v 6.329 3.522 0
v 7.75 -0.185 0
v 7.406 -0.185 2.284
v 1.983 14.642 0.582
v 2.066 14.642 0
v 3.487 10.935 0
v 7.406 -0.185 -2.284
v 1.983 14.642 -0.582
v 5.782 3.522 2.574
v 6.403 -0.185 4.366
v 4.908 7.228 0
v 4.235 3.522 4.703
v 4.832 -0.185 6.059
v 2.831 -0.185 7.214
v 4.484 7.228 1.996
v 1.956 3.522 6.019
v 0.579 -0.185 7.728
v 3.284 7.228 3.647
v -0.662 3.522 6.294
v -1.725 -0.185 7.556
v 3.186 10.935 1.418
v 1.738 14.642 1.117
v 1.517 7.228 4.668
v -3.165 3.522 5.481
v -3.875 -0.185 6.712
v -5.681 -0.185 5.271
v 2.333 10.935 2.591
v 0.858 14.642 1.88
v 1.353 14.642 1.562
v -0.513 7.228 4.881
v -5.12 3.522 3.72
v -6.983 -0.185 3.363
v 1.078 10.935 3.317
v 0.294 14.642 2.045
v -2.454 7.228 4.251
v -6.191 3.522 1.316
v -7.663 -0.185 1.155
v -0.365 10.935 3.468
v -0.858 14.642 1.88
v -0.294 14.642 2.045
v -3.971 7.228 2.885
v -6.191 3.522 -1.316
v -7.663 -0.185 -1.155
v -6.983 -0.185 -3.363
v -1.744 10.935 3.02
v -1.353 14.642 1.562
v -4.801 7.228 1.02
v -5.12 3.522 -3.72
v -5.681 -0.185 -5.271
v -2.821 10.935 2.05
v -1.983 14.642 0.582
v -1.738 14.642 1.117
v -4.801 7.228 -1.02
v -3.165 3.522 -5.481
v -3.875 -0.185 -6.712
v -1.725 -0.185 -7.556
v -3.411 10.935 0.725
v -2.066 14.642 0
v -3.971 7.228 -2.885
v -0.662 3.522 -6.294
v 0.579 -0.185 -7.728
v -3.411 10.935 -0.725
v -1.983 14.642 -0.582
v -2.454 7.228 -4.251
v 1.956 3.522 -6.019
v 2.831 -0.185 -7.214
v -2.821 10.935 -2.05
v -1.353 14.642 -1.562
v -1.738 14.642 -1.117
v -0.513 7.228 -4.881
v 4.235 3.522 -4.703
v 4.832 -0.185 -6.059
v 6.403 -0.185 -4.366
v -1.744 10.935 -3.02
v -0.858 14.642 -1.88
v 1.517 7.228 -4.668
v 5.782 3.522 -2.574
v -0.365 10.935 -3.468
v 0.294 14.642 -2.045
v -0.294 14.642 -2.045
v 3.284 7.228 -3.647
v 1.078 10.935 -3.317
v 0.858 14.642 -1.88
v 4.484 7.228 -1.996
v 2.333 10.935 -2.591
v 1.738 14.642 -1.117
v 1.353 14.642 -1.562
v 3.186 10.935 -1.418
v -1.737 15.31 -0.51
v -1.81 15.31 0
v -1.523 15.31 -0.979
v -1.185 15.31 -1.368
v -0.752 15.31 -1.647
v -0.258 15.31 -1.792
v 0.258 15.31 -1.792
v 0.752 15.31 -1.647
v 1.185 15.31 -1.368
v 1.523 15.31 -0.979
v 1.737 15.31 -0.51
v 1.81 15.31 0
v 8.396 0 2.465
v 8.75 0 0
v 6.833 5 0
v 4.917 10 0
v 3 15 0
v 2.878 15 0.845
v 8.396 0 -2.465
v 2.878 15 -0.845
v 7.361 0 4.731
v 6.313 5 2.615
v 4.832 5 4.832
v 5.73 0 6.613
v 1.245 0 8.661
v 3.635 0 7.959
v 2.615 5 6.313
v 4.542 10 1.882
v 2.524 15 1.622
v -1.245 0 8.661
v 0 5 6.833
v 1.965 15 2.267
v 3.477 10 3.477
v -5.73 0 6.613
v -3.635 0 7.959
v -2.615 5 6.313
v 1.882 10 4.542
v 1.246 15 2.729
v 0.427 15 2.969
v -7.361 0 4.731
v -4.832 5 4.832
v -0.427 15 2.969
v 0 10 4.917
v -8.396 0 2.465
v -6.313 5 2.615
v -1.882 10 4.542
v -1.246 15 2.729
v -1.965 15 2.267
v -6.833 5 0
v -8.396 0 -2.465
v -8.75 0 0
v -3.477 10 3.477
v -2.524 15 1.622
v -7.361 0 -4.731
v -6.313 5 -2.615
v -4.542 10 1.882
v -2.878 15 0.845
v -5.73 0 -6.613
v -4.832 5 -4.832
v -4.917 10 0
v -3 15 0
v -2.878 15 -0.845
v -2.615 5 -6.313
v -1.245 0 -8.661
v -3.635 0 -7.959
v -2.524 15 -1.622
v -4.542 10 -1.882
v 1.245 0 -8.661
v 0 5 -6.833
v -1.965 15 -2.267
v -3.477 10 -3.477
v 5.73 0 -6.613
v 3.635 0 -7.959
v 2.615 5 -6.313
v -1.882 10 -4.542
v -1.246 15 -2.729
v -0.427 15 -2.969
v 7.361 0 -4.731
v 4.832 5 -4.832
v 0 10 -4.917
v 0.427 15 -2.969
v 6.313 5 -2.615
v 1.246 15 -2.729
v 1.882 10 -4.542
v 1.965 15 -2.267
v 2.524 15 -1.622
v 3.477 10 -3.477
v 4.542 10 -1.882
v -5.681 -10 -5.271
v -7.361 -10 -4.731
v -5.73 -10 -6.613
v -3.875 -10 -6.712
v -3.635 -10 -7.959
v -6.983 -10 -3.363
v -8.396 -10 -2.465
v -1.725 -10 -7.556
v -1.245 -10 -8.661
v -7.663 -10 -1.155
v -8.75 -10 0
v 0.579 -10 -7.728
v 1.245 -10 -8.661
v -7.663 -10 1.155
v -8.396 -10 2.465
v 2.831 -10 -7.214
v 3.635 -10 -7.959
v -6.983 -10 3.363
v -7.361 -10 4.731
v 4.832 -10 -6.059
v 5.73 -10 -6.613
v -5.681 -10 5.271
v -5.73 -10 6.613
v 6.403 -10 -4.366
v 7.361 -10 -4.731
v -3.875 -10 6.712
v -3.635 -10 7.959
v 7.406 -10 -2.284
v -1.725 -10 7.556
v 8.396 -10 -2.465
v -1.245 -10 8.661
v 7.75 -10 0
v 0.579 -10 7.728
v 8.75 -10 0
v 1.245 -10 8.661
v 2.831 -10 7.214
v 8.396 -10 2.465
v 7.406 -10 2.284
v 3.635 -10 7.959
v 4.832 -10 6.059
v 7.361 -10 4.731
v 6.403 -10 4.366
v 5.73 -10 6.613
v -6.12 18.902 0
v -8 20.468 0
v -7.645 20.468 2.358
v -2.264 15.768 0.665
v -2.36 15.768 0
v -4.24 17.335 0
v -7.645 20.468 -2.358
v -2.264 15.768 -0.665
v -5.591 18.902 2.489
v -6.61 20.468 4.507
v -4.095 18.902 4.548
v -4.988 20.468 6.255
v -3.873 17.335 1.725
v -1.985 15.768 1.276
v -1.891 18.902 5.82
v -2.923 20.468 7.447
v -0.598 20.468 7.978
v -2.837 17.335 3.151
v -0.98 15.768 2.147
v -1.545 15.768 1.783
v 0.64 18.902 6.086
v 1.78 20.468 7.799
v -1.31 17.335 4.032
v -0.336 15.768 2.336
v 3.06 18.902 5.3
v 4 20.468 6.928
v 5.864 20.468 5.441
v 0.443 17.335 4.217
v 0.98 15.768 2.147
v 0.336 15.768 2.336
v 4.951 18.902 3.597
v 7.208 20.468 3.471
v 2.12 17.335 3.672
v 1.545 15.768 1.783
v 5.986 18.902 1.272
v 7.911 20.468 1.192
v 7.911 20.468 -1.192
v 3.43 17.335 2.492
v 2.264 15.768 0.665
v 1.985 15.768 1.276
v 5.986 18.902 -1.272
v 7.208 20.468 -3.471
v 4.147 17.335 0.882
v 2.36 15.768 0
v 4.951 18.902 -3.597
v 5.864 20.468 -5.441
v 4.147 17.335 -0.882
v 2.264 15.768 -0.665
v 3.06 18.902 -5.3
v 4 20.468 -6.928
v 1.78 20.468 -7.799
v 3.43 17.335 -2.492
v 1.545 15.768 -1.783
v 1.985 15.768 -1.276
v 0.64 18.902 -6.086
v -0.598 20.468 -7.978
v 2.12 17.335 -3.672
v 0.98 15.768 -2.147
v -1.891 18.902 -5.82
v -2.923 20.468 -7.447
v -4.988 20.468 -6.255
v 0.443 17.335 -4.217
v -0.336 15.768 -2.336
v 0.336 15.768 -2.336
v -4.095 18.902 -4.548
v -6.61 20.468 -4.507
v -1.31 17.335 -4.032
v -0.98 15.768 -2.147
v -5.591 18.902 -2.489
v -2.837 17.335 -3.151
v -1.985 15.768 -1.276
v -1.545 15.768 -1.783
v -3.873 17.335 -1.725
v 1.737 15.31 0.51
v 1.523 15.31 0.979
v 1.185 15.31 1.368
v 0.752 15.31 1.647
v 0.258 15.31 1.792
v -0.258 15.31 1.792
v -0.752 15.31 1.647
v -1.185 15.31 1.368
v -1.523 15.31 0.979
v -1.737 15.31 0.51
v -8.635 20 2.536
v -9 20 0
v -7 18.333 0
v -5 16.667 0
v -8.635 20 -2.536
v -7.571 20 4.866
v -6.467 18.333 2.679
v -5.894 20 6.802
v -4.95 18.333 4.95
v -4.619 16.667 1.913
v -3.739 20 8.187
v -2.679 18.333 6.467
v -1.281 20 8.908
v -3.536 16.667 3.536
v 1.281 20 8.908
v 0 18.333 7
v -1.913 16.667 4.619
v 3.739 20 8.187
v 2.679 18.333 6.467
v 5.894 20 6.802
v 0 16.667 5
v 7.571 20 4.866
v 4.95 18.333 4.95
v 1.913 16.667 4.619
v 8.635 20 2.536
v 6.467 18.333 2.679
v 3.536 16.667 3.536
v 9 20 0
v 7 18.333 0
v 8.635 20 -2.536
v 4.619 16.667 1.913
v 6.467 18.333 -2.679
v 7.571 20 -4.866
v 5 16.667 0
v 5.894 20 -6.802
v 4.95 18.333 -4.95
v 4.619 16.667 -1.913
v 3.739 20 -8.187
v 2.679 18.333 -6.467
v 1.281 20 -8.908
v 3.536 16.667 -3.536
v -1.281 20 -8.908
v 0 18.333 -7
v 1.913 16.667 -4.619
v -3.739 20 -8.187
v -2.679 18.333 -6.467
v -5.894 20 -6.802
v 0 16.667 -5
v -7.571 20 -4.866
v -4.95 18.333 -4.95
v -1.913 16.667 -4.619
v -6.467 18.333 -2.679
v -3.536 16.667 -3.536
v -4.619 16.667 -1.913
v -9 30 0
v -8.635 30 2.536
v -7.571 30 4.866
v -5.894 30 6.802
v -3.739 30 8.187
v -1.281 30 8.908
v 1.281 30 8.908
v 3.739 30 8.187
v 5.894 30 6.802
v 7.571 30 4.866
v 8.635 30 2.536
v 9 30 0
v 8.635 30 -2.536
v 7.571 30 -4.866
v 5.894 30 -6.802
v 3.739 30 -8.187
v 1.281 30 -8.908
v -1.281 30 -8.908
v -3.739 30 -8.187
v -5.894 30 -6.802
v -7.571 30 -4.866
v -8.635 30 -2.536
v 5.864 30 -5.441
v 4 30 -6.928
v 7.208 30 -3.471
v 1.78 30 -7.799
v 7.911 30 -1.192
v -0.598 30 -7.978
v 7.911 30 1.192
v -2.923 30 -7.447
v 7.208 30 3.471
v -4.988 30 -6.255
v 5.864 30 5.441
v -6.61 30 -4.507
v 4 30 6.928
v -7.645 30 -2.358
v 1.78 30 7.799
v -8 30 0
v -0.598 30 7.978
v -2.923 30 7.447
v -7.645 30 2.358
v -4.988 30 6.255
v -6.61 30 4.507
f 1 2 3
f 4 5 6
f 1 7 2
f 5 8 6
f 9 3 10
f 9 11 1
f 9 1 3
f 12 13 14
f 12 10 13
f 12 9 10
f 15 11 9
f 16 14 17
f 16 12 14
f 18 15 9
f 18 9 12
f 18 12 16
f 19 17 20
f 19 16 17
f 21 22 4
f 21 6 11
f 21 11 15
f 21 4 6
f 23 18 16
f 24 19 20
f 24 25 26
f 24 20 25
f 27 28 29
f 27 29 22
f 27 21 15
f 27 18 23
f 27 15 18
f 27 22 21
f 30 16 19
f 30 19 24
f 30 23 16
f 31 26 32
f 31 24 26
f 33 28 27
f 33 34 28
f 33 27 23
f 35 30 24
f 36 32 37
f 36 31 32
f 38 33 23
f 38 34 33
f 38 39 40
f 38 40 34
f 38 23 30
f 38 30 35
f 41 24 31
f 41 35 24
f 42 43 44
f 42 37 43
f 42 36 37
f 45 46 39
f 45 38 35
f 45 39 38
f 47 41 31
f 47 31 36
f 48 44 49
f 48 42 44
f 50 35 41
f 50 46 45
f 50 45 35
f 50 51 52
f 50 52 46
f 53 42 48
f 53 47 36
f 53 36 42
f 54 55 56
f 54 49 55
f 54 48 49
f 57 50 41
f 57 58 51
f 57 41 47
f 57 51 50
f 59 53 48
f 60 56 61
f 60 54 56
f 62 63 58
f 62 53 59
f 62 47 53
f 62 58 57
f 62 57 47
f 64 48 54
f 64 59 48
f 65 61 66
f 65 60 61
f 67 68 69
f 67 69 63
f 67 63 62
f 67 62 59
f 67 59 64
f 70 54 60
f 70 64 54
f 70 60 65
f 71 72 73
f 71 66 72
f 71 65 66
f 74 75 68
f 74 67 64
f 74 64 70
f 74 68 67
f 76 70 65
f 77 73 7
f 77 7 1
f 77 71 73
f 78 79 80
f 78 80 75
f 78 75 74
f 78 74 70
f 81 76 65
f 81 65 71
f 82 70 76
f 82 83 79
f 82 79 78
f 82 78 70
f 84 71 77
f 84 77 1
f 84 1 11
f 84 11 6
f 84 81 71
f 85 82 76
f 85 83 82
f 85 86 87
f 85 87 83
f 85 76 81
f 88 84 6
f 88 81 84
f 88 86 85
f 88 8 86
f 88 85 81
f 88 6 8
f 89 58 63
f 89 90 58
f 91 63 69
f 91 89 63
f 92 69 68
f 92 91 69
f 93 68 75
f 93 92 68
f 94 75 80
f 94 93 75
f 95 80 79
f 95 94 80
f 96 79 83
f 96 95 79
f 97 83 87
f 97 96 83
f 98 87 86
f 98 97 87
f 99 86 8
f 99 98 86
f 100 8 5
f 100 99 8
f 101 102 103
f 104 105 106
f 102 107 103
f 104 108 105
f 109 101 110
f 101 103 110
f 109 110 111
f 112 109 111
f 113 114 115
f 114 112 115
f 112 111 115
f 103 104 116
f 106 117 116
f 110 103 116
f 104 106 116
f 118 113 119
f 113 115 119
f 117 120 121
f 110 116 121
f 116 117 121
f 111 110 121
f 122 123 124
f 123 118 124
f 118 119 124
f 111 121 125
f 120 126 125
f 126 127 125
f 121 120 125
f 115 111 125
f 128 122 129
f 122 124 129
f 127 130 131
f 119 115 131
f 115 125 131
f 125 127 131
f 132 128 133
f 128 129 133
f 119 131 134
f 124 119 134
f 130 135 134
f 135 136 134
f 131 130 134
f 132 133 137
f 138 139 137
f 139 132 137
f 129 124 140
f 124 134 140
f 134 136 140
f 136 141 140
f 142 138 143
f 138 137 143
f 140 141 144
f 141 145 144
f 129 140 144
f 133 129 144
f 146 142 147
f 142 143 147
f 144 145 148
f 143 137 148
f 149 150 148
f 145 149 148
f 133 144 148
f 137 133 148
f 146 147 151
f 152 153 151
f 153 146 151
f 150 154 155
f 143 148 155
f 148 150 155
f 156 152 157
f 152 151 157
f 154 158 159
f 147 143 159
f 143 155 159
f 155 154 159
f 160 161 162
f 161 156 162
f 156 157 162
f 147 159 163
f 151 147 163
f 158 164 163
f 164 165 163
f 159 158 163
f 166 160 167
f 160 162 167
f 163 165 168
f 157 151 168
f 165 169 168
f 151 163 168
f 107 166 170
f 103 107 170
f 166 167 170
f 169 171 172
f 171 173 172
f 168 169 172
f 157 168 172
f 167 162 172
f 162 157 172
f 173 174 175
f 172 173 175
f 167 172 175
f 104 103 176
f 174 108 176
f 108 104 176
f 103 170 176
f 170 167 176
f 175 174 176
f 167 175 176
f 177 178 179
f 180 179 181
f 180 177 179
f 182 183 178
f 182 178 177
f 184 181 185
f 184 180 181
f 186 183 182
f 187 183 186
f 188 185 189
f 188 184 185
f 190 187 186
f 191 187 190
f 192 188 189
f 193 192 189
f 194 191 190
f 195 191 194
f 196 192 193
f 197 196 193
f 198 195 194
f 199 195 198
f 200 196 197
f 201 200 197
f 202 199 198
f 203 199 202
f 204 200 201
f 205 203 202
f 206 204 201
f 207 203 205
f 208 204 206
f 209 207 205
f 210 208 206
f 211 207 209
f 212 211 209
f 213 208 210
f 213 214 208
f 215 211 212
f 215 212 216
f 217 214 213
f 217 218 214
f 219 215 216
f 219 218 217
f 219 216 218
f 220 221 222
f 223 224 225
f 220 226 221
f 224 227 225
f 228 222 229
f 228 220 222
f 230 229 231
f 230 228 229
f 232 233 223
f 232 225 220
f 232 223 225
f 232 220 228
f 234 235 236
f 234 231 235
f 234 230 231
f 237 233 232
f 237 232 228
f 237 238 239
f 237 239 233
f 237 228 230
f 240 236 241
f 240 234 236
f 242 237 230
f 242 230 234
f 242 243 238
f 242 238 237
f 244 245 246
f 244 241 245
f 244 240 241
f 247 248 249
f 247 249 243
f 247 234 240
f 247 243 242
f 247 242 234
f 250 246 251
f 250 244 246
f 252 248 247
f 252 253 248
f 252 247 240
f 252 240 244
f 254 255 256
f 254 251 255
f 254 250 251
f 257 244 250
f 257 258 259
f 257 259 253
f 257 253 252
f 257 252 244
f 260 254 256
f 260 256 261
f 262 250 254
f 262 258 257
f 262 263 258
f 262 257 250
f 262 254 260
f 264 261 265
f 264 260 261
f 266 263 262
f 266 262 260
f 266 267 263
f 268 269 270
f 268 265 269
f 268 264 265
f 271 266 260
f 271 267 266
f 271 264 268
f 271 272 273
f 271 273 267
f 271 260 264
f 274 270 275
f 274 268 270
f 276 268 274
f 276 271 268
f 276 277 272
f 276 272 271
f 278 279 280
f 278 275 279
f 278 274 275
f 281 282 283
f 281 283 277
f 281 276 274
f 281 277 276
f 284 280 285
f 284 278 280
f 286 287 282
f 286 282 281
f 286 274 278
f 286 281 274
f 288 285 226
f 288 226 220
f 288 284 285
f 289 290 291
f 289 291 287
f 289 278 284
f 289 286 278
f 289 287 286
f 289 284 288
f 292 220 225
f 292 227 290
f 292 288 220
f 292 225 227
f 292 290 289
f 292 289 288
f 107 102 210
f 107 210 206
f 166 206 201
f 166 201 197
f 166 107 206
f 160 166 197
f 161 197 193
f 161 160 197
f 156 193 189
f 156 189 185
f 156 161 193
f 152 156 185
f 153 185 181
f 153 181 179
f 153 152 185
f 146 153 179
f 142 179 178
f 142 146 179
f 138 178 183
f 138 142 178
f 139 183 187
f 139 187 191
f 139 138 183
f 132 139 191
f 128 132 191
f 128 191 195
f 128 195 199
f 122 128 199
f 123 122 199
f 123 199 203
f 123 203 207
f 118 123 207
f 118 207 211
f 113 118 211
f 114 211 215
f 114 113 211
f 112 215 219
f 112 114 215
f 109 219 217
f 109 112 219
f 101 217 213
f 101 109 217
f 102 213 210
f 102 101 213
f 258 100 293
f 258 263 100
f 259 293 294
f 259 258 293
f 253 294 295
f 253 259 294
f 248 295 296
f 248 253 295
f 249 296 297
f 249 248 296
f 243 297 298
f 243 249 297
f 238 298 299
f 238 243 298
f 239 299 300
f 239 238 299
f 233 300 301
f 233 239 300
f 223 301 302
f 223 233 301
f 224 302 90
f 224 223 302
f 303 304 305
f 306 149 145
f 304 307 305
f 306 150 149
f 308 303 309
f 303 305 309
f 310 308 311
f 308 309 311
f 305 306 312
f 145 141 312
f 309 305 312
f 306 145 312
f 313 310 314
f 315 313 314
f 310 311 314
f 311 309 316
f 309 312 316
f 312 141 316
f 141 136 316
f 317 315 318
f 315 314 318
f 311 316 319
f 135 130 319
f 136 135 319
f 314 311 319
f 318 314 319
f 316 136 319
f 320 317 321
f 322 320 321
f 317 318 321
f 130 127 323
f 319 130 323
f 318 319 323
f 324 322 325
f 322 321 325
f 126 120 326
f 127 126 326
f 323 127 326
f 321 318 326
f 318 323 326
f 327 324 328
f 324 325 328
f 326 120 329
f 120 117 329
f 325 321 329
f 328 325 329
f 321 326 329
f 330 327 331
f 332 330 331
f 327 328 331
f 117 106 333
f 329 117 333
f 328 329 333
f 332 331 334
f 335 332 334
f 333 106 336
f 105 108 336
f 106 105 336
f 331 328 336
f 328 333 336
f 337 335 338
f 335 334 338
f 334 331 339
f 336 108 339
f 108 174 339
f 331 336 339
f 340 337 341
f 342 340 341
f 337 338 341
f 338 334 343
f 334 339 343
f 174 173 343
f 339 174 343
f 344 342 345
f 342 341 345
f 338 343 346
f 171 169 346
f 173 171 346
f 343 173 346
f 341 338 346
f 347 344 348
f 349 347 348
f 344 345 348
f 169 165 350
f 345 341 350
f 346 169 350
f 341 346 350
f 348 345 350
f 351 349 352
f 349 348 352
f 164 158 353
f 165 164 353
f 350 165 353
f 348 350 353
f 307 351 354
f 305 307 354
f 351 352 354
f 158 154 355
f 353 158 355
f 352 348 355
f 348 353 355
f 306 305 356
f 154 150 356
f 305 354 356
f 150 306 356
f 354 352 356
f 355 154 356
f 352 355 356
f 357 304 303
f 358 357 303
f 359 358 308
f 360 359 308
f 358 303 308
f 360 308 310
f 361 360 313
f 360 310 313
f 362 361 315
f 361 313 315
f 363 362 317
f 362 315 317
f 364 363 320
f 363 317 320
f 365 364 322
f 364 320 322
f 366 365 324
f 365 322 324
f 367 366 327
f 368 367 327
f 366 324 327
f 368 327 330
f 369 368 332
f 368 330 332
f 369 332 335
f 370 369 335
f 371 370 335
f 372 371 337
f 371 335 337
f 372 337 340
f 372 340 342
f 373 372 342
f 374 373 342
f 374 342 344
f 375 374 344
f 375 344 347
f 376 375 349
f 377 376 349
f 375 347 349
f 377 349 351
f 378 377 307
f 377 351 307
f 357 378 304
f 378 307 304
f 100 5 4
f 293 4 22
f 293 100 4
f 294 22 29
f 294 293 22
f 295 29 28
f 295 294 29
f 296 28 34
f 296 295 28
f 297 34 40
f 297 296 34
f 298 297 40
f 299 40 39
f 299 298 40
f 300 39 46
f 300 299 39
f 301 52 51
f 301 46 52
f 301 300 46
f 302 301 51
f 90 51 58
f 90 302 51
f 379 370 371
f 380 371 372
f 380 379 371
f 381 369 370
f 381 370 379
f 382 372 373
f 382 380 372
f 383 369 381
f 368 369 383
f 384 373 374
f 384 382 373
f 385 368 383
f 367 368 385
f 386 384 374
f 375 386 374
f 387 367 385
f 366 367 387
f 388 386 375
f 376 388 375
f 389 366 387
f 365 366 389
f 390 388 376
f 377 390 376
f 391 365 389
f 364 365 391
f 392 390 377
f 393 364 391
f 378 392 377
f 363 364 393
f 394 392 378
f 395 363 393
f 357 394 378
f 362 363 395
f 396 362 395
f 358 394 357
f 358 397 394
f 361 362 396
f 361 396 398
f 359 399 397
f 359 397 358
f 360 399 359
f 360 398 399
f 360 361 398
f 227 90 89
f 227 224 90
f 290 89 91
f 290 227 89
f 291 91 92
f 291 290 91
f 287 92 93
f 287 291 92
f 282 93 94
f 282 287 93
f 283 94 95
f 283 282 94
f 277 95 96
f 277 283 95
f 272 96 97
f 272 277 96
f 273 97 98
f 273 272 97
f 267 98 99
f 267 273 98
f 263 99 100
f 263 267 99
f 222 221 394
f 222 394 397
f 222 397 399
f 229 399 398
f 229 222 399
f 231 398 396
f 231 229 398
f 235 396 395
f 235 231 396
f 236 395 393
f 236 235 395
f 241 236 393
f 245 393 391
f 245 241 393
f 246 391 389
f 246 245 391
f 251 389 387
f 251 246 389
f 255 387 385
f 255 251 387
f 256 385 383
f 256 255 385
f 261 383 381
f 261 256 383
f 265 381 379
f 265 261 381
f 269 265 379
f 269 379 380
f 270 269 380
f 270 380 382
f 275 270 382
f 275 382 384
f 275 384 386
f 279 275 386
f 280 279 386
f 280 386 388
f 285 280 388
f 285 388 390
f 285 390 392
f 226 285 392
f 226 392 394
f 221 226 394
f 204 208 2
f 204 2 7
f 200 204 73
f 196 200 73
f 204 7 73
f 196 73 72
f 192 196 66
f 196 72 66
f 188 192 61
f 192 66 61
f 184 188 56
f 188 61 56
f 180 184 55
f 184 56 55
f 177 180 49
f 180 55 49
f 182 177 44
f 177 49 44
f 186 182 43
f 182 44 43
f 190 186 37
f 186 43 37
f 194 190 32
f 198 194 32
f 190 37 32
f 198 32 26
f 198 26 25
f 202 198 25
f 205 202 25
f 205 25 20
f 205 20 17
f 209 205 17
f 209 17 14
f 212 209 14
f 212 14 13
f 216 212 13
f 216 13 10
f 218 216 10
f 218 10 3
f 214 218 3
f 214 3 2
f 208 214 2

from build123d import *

# Parameters (mm, degrees)
F0_R         = 8.75
F4_R         = 3
F6_DEPTH     = 10
F10_R        = 9
F5_FACE1_R   = 3
F12_DEPTH    = 10
F13_T        = 1
F13_T4_ANGLE = 180.000000001
F13_T6_ANGLE = 180.000000001


# Not quite as in the source:
# - a shell that OpenCascade refuses in one call is made with other operations: the cavity is built on its own and cut out


with BuildPart() as f5:
    # F0 (on Front) → F5 section 0
    with BuildSketch(Plane.XZ):
        Circle(F0_R)
    # F4 (on line) → F5 section 1
    with BuildSketch(Plane(origin=(0, 15, 0), x_dir=(-1, 0, 0), z_dir=(0, 1, 0))):
        Circle(F4_R)
    loft()

    # F6 (add): a face of the model
    f6_faces = [f5.faces().sort_by_distance(p)[0] for p in [
        (0, 0, 0),
    ]]
    extrude(f6_faces, amount=F6_DEPTH)

    # F10 (on line) → F11 section 0
    with BuildSketch(Plane(origin=(0, 20, 0), x_dir=(-1, 0, 0), z_dir=(0, 1, 0))):
        Circle(F10_R)
    # F5_face1 (on face) → F11 section 1
    with BuildSketch(Plane(origin=(0, 15, 0), x_dir=(-1, 0, 0), z_dir=(0, 1, 0))):
        Circle(F5_FACE1_R)
    loft()

    # F12 (add): a face of the model
    f12_faces = [f5.faces().sort_by_distance(p)[0] for p in [
        (0, 20, 0),
    ]]
    extrude(f12_faces, amount=F12_DEPTH)

    # F13: shell of thickness 1, made by hand


with BuildPart() as f13_core1:
    # F13_t2: copy of F5
    add(f5.part)

    # the walls: a layer under each face that stays
    f13_faces = [f13_core1.faces().sort_by_distance(p)[0] for p in [
        (-5.875, 7.5, 0),
        (6, 17.5, 0),
        (-8.75, -5, 0),
        (9, 25, 0),
    ]]
    thicken(f13_faces, amount=-F13_T, mode=Mode.SUBTRACT)

    # F13_s3 → F13_t4 (revolve, cut)
    with BuildSketch(Plane.XY):
        Polygon((3.0157393052, 14.9958971473), (2.0662538827, 14.6420639884), (1.8101483908, 15.3101652716), (2.3598156003, 15.7682212796), align=None)
    revolve(axis=Axis((0, 15, 0), (0, -1, 0)), revolution_arc=F13_T4_ANGLE, mode=Mode.SUBTRACT)

    # F13_s5 → F13_t6 (revolve, cut)
    with BuildSketch(Plane.XY):
        Polygon((-3.0157393052, 14.9958971473), (-2.0662538827, 14.6420639884), (-1.8101483908, 15.3101652716), (-2.3598156003, 15.7682212796), align=None)
    revolve(axis=Axis((0, 15, 0), (0, -1, 0)), revolution_arc=F13_T6_ANGLE, mode=Mode.SUBTRACT)


with BuildPart() as f5_1:
    add(f5.part)

    # what is left inside the walls is the cavity
    f13_cavity = [f13_core1.part.solids().sort_by_distance(p)[0] for p in [
        (-5.84608, 4.753709, 0),
    ]]
    add(f13_cavity, mode=Mode.SUBTRACT)


solid = f5_1.part
